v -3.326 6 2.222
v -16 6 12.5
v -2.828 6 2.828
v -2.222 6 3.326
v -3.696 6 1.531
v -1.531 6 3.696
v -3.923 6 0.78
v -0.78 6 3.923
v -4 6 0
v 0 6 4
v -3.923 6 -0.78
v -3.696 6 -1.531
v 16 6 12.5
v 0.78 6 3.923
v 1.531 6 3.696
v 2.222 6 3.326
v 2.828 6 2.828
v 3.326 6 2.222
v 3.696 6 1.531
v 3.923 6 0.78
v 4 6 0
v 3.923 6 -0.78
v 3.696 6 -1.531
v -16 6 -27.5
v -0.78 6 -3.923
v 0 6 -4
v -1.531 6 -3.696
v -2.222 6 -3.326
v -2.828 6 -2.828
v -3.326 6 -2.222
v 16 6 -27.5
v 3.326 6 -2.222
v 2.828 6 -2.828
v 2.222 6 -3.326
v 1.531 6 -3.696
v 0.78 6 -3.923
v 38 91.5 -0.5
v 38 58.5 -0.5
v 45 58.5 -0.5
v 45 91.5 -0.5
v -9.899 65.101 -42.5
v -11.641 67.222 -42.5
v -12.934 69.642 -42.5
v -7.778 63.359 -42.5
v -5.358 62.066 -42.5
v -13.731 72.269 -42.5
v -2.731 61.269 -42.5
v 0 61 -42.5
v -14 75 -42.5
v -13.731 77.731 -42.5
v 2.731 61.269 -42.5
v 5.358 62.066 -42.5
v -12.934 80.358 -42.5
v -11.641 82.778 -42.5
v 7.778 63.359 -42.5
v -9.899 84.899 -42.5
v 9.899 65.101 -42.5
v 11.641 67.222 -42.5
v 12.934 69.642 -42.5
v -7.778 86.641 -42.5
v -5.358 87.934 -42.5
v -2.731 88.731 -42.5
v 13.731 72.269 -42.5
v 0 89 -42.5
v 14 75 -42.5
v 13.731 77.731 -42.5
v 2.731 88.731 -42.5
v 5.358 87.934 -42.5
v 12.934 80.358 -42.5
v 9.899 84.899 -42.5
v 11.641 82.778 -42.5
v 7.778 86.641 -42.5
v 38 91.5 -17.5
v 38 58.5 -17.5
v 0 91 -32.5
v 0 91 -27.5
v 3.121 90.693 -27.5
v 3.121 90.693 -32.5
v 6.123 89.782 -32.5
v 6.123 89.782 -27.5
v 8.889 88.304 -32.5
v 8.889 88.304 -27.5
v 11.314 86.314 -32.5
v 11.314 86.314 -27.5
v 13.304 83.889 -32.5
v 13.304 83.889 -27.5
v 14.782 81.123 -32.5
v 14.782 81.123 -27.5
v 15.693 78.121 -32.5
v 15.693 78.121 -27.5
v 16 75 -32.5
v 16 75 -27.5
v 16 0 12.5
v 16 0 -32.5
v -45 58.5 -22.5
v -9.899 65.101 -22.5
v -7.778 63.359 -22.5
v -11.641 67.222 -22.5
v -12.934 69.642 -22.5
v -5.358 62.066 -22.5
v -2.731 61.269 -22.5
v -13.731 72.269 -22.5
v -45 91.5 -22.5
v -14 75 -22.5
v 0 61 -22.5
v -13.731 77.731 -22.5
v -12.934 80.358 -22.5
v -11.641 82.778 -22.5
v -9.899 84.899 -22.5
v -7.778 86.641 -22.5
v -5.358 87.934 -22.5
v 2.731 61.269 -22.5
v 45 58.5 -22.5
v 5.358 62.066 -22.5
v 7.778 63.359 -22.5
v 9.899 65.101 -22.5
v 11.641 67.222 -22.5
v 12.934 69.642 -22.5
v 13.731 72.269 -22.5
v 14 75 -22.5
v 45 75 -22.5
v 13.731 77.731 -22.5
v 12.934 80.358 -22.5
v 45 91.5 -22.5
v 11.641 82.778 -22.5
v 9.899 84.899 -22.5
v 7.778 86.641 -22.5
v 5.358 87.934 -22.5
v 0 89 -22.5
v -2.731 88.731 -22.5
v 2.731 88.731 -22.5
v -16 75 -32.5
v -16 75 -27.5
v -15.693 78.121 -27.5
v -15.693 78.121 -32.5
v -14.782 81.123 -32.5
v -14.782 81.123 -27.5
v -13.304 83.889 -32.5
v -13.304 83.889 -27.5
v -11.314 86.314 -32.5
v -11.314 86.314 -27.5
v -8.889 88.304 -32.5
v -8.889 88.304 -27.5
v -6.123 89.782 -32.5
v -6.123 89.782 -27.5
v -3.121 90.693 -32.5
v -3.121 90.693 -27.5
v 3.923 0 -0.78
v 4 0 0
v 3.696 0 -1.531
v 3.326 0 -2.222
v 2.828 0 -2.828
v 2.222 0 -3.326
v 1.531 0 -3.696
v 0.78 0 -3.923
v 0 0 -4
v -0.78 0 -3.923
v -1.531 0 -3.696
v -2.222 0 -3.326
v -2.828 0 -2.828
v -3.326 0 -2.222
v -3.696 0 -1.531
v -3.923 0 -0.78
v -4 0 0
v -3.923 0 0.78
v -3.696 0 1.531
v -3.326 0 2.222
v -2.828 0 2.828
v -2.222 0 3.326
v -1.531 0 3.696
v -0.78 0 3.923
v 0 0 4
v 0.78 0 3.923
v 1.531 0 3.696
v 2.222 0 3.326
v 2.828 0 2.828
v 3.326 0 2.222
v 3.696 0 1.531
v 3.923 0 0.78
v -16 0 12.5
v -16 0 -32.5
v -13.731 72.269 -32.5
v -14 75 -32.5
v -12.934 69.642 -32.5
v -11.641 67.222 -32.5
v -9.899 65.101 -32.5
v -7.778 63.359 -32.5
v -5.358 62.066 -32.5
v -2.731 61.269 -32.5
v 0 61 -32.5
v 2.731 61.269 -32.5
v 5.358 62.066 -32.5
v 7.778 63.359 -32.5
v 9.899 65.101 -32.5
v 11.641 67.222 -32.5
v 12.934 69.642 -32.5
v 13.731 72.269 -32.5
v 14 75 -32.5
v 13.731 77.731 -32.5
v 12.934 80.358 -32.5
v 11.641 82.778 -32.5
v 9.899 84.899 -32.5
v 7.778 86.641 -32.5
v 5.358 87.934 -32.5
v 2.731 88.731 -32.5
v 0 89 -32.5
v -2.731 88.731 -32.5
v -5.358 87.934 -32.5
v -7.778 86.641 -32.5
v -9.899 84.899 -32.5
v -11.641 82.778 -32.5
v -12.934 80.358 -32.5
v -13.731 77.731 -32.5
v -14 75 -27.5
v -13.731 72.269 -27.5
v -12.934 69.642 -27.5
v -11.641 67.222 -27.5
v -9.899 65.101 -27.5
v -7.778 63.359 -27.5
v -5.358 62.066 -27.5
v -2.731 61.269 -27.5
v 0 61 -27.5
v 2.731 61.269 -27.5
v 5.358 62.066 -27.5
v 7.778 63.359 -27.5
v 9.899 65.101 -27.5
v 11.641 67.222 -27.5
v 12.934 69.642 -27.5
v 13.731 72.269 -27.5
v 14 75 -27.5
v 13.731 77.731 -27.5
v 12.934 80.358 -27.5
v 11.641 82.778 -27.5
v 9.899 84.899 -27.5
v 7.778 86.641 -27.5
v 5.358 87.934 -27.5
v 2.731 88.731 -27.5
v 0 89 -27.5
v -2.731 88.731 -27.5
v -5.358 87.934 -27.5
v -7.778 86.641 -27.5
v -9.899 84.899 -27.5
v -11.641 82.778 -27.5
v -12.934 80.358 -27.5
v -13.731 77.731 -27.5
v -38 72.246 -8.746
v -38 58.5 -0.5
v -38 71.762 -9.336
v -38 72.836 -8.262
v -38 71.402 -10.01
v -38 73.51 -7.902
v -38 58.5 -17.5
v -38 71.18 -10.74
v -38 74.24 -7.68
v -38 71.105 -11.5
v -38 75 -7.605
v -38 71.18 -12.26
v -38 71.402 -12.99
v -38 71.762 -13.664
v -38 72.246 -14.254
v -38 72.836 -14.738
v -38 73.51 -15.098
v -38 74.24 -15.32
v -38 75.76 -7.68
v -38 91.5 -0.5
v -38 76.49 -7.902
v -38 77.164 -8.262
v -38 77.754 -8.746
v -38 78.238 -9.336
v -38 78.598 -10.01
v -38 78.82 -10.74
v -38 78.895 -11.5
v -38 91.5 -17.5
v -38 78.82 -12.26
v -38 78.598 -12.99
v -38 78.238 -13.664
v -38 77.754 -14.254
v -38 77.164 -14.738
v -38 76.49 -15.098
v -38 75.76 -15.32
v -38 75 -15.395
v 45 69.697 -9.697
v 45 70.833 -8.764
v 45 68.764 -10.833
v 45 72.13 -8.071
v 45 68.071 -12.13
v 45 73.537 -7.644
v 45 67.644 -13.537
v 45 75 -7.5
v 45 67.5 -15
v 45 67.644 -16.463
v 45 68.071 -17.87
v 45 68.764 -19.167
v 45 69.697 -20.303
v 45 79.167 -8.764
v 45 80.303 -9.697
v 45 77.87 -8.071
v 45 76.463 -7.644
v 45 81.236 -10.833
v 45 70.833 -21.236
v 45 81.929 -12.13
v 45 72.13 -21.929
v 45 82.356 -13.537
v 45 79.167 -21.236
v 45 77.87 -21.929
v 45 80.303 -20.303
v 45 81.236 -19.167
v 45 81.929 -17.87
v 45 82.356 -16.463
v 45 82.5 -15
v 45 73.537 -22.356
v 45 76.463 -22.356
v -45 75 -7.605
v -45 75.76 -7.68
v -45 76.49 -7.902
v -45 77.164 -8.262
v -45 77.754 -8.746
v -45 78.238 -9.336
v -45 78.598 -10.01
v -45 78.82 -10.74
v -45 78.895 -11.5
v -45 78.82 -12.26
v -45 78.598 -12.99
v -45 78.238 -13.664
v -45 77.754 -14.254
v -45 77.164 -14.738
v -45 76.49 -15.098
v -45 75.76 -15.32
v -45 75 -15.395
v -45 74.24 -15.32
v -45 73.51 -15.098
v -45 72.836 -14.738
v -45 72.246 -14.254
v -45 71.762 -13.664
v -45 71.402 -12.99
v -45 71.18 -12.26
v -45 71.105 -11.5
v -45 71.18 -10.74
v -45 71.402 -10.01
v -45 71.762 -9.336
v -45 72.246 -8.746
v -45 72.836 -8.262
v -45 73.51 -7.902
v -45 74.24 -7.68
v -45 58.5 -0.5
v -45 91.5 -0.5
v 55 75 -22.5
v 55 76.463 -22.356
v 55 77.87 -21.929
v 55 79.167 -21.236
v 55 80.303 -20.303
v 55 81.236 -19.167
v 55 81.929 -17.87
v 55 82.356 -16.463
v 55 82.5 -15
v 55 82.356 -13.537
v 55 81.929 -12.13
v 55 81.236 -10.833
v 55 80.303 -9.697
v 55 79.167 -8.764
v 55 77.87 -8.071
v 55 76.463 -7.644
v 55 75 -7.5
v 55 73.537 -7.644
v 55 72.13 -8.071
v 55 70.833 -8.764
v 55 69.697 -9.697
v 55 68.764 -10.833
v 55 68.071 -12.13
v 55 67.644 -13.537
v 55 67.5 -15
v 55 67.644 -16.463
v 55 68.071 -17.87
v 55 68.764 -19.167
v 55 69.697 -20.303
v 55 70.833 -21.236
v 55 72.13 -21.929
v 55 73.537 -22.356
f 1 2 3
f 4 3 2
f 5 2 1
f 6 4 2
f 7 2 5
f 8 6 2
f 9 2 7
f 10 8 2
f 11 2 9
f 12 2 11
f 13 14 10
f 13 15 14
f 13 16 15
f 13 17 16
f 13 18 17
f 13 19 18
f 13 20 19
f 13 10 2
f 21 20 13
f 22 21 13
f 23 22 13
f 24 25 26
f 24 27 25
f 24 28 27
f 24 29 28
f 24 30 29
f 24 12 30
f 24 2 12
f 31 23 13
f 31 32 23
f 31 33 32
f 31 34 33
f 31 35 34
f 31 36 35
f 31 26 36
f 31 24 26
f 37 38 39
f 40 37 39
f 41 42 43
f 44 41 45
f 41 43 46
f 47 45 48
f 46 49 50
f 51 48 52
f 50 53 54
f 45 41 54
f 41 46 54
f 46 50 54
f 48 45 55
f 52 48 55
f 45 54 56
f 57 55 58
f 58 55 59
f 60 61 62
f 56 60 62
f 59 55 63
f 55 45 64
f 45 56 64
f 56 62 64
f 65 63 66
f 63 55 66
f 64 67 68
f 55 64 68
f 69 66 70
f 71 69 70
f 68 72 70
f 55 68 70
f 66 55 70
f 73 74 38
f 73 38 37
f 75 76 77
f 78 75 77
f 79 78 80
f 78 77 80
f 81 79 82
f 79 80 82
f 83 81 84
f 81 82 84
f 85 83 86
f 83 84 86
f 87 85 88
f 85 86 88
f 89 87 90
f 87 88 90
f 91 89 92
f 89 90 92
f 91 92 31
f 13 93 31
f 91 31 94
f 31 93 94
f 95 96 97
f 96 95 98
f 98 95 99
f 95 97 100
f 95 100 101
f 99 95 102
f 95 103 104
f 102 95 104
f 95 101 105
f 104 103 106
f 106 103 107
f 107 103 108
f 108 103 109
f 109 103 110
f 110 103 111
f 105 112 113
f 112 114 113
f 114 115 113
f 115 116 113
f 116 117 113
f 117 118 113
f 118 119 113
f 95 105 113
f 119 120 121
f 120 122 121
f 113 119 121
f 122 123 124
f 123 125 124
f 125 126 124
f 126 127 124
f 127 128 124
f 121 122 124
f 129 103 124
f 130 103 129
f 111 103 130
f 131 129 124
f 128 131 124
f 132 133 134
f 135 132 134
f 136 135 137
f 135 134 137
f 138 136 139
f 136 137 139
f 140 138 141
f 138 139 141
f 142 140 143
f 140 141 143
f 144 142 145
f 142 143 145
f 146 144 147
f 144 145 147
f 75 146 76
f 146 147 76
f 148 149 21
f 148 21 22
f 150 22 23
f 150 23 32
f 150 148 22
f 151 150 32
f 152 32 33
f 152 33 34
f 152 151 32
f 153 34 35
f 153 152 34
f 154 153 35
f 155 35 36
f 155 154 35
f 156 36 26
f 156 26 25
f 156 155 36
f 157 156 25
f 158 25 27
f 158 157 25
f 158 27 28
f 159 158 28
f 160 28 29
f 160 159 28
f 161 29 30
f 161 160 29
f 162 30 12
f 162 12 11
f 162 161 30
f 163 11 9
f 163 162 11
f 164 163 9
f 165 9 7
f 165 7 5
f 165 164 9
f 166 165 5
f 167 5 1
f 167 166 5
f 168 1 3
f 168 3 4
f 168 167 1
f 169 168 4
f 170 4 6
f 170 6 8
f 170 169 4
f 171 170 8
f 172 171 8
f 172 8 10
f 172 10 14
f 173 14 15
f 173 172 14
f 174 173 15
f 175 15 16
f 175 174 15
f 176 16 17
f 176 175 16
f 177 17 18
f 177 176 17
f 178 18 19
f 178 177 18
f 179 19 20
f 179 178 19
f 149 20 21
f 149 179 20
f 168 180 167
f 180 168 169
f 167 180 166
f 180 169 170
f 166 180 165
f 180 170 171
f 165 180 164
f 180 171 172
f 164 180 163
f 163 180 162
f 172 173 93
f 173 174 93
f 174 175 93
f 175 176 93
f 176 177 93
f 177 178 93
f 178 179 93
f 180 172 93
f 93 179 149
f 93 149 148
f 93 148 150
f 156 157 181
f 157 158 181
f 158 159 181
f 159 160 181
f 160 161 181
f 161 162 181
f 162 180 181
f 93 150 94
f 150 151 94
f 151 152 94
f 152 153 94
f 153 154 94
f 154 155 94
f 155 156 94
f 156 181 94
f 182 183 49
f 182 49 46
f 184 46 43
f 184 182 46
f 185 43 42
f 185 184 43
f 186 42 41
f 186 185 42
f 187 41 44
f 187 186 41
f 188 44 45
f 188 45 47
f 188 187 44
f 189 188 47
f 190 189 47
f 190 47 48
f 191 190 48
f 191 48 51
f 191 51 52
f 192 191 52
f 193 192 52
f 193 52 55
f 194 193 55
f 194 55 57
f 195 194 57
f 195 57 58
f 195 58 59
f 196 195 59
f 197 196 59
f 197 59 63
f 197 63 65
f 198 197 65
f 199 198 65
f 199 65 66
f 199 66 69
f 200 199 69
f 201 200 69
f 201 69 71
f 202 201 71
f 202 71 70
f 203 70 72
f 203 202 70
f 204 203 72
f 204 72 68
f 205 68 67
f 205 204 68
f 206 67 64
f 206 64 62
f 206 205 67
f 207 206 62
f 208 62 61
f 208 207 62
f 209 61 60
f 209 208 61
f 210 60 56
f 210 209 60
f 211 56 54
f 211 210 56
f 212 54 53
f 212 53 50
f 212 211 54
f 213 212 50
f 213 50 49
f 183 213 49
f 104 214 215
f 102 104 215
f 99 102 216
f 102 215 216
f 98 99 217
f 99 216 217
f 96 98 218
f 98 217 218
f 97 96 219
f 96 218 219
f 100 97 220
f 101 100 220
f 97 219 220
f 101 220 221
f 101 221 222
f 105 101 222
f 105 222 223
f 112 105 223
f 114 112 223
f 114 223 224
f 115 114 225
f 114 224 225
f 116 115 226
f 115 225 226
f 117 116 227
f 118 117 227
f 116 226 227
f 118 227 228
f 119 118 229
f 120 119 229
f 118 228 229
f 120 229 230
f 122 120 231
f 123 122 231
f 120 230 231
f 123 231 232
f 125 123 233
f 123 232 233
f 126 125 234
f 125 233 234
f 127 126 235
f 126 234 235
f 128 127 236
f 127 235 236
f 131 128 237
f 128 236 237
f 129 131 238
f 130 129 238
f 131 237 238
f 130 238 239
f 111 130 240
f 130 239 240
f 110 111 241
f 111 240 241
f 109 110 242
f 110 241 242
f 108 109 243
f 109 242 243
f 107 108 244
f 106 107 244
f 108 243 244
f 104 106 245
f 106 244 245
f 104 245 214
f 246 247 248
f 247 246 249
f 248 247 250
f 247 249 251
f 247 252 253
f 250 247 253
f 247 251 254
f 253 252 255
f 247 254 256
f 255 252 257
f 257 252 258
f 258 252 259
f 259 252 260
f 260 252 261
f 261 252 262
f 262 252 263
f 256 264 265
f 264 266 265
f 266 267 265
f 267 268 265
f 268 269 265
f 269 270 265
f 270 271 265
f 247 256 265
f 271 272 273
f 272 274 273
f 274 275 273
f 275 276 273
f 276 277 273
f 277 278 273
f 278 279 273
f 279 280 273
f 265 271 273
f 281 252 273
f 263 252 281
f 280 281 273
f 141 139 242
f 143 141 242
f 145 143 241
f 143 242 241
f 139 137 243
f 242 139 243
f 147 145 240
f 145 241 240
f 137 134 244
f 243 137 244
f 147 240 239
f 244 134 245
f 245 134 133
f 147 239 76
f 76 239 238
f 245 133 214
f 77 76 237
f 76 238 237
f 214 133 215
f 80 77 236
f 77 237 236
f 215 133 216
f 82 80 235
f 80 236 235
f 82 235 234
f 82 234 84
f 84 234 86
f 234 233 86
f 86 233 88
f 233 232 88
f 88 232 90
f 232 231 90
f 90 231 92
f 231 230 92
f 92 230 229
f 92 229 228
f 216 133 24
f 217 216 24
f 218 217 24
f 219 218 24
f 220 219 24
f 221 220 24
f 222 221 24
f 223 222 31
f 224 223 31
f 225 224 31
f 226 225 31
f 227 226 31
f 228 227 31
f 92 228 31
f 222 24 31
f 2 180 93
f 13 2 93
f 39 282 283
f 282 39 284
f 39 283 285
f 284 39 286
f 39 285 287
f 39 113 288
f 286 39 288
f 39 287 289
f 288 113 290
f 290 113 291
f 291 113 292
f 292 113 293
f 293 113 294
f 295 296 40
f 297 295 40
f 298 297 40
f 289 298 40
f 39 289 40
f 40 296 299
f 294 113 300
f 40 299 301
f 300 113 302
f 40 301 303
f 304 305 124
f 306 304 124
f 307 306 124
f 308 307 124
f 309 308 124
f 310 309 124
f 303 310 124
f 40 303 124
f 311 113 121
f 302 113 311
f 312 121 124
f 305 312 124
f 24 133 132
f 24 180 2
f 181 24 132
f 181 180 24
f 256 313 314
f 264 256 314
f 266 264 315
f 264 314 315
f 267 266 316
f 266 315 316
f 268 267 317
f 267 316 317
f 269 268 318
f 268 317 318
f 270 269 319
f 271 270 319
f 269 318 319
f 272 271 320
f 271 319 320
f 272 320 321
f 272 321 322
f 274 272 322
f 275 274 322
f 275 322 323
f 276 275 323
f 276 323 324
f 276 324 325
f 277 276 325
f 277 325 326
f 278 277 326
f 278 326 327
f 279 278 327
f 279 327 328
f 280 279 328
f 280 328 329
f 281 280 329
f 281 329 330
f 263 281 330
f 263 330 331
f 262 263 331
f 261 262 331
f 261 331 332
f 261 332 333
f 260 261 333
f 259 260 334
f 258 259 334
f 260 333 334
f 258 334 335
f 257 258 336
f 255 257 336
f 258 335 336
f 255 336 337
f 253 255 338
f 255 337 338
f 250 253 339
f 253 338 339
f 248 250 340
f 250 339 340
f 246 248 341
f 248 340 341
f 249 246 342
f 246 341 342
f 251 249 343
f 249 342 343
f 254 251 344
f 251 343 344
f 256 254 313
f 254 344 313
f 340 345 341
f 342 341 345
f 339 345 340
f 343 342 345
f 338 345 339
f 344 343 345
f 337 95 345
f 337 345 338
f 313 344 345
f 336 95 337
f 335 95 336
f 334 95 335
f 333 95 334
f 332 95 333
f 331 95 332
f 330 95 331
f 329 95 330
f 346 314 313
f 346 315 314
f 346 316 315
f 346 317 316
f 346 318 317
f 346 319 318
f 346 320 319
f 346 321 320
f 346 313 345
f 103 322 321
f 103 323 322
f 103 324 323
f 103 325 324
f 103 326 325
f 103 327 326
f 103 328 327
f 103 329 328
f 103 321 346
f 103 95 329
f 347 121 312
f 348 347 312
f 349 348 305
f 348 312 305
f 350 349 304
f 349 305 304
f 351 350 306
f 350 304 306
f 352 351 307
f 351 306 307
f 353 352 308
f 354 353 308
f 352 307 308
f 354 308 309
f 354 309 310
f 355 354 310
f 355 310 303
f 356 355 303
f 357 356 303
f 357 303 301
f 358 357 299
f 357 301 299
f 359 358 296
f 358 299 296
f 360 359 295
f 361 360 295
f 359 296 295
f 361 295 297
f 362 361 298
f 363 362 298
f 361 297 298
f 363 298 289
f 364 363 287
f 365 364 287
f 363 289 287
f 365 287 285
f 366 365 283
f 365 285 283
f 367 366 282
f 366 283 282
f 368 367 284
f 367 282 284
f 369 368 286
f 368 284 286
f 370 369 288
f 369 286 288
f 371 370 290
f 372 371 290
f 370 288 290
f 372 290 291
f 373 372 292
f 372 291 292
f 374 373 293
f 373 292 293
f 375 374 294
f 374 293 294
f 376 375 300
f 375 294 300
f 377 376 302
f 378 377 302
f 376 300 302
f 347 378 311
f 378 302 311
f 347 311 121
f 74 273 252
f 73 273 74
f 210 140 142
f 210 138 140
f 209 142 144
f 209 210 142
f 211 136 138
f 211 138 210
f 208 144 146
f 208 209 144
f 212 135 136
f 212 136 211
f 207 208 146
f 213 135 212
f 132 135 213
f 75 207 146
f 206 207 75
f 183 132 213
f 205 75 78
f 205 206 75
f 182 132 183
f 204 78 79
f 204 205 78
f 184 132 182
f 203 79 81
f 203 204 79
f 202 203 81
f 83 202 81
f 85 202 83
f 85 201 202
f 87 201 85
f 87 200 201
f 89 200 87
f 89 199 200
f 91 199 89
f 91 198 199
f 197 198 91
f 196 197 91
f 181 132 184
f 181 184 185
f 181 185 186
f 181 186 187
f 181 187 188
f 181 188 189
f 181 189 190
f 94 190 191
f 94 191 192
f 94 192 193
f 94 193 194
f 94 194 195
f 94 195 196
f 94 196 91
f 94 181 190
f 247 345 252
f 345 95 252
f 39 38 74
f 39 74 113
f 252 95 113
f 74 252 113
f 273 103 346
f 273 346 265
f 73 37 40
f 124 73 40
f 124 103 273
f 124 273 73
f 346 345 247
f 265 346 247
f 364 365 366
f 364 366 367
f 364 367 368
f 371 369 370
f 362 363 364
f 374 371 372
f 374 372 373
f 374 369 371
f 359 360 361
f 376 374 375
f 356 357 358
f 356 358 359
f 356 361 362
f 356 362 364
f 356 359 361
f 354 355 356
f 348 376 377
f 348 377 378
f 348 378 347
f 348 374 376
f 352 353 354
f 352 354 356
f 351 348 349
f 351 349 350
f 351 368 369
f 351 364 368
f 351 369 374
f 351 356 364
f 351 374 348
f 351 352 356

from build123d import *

# Parameters (mm, degrees)
SKETCH1_W                = 32
SKETCH1_H                = 45
SKETCH1_R                = 4
BOSS_EXTRUDE1_DEPTH      = 6
SKETCH2_W                = 32
SKETCH2_H                = 5
BOSS_EXTRUDE2_DEPTH      = 85
CUT_EXTRUDE1_DEPTH       = 85
BOSS_EXTRUDE4_DEPTH      = 5
BOSS_EXTRUDE4_DEPTH_BACK = 15
SKETCH5_W                = 90
SKETCH5_H                = 33
BOSS_EXTRUDE5_DEPTH      = 5
SKETCH6_W                = 7
SKETCH6_H                = 33
BOSS_EXTRUDE6_DEPTH      = 17
SKETCH7_R                = 7.5
BOSS_EXTRUDE7_DEPTH      = 10
SKETCH8_R                = 3.894699497
CUT_EXTRUDE2_DEPTH       = 10


with BuildPart() as part:
    # Sketch1 → Boss-Extrude1 (new body)
    with BuildSketch(Plane(origin=(0, 0, 0), x_dir=(1, 0, 0), z_dir=(0, 1, 0))):
        with Locations((0, 10)):
            Rectangle(SKETCH1_W, SKETCH1_H)
        Circle(SKETCH1_R, mode=Mode.SUBTRACT)
    extrude(amount=BOSS_EXTRUDE1_DEPTH)

    # Sketch2 → Boss-Extrude2 (add)
    with BuildSketch(Plane(origin=(0, 6, 0), x_dir=(1, 0, 0), z_dir=(0, 1, 0))):
        with Locations((0, 30)):
            Rectangle(SKETCH2_W, SKETCH2_H)
    extrude(amount=BOSS_EXTRUDE2_DEPTH)

    # Sketch3 → Cut-Extrude1 (cut)
    with BuildSketch(Plane.XY.offset(-27.5)):
        with BuildLine():
            Line((-16, 91), (-16, 75))
            ThreePointArc((-16, 75), (-11.313708499, 86.313708499), (0, 91))
            Line((0, 91), (-16, 91))
        make_face()
        with BuildLine():
            ThreePointArc((0, 91), (11.313708499, 86.313708499), (16, 75))
            Line((16, 75), (16, 91))
            Line((16, 91), (0, 91))
        make_face()
    extrude(amount=-CUT_EXTRUDE1_DEPTH, mode=Mode.SUBTRACT)

    # Sketch4 → Boss-Extrude4 (add, two sides)
    with BuildSketch(Plane.XY.offset(-27.5)) as boss_extrude4_sk:
        with BuildLine():
            ThreePointArc((14, 75), (0, 89), (-14, 75))
            Line((-14, 75), (14, 75))
        make_face()
        with BuildLine():
            Line((14, 75), (-14, 75))
            ThreePointArc((-14, 75), (0, 61), (14, 75))
        make_face()
    extrude(amount=BOSS_EXTRUDE4_DEPTH)
    extrude(boss_extrude4_sk.sketch, amount=-BOSS_EXTRUDE4_DEPTH_BACK)

    # Sketch5 → Boss-Extrude5 (add)
    with BuildSketch(Plane.XY.offset(-22.5)):
        with Locations((0, 75)):
            Rectangle(SKETCH5_W, SKETCH5_H)
    extrude(amount=BOSS_EXTRUDE5_DEPTH)

    # Sketch6 → Boss-Extrude6 (add)
    with BuildSketch(Plane.XY.offset(-17.5)):
        with Locations((-41.5, 75)):
            Rectangle(SKETCH6_W, SKETCH6_H)
        with Locations((41.5, 75)):
            Rectangle(SKETCH6_W, SKETCH6_H)
    extrude(amount=BOSS_EXTRUDE6_DEPTH)

    # Sketch7 → Boss-Extrude7 (add)
    with BuildSketch(Plane(origin=(45, 0, 0), x_dir=(0, 0, -1), z_dir=(1, 0, 0))):
        with Locations((15, 75)):
            Circle(SKETCH7_R)
    extrude(amount=BOSS_EXTRUDE7_DEPTH)

    # Sketch8 → Cut-Extrude2 (cut)
    with BuildSketch(Plane.ZY.offset(45)):
        with Locations((-11.5, 75)):
            Circle(SKETCH8_R)
    extrude(amount=-CUT_EXTRUDE2_DEPTH, mode=Mode.SUBTRACT)


solid = part.part
